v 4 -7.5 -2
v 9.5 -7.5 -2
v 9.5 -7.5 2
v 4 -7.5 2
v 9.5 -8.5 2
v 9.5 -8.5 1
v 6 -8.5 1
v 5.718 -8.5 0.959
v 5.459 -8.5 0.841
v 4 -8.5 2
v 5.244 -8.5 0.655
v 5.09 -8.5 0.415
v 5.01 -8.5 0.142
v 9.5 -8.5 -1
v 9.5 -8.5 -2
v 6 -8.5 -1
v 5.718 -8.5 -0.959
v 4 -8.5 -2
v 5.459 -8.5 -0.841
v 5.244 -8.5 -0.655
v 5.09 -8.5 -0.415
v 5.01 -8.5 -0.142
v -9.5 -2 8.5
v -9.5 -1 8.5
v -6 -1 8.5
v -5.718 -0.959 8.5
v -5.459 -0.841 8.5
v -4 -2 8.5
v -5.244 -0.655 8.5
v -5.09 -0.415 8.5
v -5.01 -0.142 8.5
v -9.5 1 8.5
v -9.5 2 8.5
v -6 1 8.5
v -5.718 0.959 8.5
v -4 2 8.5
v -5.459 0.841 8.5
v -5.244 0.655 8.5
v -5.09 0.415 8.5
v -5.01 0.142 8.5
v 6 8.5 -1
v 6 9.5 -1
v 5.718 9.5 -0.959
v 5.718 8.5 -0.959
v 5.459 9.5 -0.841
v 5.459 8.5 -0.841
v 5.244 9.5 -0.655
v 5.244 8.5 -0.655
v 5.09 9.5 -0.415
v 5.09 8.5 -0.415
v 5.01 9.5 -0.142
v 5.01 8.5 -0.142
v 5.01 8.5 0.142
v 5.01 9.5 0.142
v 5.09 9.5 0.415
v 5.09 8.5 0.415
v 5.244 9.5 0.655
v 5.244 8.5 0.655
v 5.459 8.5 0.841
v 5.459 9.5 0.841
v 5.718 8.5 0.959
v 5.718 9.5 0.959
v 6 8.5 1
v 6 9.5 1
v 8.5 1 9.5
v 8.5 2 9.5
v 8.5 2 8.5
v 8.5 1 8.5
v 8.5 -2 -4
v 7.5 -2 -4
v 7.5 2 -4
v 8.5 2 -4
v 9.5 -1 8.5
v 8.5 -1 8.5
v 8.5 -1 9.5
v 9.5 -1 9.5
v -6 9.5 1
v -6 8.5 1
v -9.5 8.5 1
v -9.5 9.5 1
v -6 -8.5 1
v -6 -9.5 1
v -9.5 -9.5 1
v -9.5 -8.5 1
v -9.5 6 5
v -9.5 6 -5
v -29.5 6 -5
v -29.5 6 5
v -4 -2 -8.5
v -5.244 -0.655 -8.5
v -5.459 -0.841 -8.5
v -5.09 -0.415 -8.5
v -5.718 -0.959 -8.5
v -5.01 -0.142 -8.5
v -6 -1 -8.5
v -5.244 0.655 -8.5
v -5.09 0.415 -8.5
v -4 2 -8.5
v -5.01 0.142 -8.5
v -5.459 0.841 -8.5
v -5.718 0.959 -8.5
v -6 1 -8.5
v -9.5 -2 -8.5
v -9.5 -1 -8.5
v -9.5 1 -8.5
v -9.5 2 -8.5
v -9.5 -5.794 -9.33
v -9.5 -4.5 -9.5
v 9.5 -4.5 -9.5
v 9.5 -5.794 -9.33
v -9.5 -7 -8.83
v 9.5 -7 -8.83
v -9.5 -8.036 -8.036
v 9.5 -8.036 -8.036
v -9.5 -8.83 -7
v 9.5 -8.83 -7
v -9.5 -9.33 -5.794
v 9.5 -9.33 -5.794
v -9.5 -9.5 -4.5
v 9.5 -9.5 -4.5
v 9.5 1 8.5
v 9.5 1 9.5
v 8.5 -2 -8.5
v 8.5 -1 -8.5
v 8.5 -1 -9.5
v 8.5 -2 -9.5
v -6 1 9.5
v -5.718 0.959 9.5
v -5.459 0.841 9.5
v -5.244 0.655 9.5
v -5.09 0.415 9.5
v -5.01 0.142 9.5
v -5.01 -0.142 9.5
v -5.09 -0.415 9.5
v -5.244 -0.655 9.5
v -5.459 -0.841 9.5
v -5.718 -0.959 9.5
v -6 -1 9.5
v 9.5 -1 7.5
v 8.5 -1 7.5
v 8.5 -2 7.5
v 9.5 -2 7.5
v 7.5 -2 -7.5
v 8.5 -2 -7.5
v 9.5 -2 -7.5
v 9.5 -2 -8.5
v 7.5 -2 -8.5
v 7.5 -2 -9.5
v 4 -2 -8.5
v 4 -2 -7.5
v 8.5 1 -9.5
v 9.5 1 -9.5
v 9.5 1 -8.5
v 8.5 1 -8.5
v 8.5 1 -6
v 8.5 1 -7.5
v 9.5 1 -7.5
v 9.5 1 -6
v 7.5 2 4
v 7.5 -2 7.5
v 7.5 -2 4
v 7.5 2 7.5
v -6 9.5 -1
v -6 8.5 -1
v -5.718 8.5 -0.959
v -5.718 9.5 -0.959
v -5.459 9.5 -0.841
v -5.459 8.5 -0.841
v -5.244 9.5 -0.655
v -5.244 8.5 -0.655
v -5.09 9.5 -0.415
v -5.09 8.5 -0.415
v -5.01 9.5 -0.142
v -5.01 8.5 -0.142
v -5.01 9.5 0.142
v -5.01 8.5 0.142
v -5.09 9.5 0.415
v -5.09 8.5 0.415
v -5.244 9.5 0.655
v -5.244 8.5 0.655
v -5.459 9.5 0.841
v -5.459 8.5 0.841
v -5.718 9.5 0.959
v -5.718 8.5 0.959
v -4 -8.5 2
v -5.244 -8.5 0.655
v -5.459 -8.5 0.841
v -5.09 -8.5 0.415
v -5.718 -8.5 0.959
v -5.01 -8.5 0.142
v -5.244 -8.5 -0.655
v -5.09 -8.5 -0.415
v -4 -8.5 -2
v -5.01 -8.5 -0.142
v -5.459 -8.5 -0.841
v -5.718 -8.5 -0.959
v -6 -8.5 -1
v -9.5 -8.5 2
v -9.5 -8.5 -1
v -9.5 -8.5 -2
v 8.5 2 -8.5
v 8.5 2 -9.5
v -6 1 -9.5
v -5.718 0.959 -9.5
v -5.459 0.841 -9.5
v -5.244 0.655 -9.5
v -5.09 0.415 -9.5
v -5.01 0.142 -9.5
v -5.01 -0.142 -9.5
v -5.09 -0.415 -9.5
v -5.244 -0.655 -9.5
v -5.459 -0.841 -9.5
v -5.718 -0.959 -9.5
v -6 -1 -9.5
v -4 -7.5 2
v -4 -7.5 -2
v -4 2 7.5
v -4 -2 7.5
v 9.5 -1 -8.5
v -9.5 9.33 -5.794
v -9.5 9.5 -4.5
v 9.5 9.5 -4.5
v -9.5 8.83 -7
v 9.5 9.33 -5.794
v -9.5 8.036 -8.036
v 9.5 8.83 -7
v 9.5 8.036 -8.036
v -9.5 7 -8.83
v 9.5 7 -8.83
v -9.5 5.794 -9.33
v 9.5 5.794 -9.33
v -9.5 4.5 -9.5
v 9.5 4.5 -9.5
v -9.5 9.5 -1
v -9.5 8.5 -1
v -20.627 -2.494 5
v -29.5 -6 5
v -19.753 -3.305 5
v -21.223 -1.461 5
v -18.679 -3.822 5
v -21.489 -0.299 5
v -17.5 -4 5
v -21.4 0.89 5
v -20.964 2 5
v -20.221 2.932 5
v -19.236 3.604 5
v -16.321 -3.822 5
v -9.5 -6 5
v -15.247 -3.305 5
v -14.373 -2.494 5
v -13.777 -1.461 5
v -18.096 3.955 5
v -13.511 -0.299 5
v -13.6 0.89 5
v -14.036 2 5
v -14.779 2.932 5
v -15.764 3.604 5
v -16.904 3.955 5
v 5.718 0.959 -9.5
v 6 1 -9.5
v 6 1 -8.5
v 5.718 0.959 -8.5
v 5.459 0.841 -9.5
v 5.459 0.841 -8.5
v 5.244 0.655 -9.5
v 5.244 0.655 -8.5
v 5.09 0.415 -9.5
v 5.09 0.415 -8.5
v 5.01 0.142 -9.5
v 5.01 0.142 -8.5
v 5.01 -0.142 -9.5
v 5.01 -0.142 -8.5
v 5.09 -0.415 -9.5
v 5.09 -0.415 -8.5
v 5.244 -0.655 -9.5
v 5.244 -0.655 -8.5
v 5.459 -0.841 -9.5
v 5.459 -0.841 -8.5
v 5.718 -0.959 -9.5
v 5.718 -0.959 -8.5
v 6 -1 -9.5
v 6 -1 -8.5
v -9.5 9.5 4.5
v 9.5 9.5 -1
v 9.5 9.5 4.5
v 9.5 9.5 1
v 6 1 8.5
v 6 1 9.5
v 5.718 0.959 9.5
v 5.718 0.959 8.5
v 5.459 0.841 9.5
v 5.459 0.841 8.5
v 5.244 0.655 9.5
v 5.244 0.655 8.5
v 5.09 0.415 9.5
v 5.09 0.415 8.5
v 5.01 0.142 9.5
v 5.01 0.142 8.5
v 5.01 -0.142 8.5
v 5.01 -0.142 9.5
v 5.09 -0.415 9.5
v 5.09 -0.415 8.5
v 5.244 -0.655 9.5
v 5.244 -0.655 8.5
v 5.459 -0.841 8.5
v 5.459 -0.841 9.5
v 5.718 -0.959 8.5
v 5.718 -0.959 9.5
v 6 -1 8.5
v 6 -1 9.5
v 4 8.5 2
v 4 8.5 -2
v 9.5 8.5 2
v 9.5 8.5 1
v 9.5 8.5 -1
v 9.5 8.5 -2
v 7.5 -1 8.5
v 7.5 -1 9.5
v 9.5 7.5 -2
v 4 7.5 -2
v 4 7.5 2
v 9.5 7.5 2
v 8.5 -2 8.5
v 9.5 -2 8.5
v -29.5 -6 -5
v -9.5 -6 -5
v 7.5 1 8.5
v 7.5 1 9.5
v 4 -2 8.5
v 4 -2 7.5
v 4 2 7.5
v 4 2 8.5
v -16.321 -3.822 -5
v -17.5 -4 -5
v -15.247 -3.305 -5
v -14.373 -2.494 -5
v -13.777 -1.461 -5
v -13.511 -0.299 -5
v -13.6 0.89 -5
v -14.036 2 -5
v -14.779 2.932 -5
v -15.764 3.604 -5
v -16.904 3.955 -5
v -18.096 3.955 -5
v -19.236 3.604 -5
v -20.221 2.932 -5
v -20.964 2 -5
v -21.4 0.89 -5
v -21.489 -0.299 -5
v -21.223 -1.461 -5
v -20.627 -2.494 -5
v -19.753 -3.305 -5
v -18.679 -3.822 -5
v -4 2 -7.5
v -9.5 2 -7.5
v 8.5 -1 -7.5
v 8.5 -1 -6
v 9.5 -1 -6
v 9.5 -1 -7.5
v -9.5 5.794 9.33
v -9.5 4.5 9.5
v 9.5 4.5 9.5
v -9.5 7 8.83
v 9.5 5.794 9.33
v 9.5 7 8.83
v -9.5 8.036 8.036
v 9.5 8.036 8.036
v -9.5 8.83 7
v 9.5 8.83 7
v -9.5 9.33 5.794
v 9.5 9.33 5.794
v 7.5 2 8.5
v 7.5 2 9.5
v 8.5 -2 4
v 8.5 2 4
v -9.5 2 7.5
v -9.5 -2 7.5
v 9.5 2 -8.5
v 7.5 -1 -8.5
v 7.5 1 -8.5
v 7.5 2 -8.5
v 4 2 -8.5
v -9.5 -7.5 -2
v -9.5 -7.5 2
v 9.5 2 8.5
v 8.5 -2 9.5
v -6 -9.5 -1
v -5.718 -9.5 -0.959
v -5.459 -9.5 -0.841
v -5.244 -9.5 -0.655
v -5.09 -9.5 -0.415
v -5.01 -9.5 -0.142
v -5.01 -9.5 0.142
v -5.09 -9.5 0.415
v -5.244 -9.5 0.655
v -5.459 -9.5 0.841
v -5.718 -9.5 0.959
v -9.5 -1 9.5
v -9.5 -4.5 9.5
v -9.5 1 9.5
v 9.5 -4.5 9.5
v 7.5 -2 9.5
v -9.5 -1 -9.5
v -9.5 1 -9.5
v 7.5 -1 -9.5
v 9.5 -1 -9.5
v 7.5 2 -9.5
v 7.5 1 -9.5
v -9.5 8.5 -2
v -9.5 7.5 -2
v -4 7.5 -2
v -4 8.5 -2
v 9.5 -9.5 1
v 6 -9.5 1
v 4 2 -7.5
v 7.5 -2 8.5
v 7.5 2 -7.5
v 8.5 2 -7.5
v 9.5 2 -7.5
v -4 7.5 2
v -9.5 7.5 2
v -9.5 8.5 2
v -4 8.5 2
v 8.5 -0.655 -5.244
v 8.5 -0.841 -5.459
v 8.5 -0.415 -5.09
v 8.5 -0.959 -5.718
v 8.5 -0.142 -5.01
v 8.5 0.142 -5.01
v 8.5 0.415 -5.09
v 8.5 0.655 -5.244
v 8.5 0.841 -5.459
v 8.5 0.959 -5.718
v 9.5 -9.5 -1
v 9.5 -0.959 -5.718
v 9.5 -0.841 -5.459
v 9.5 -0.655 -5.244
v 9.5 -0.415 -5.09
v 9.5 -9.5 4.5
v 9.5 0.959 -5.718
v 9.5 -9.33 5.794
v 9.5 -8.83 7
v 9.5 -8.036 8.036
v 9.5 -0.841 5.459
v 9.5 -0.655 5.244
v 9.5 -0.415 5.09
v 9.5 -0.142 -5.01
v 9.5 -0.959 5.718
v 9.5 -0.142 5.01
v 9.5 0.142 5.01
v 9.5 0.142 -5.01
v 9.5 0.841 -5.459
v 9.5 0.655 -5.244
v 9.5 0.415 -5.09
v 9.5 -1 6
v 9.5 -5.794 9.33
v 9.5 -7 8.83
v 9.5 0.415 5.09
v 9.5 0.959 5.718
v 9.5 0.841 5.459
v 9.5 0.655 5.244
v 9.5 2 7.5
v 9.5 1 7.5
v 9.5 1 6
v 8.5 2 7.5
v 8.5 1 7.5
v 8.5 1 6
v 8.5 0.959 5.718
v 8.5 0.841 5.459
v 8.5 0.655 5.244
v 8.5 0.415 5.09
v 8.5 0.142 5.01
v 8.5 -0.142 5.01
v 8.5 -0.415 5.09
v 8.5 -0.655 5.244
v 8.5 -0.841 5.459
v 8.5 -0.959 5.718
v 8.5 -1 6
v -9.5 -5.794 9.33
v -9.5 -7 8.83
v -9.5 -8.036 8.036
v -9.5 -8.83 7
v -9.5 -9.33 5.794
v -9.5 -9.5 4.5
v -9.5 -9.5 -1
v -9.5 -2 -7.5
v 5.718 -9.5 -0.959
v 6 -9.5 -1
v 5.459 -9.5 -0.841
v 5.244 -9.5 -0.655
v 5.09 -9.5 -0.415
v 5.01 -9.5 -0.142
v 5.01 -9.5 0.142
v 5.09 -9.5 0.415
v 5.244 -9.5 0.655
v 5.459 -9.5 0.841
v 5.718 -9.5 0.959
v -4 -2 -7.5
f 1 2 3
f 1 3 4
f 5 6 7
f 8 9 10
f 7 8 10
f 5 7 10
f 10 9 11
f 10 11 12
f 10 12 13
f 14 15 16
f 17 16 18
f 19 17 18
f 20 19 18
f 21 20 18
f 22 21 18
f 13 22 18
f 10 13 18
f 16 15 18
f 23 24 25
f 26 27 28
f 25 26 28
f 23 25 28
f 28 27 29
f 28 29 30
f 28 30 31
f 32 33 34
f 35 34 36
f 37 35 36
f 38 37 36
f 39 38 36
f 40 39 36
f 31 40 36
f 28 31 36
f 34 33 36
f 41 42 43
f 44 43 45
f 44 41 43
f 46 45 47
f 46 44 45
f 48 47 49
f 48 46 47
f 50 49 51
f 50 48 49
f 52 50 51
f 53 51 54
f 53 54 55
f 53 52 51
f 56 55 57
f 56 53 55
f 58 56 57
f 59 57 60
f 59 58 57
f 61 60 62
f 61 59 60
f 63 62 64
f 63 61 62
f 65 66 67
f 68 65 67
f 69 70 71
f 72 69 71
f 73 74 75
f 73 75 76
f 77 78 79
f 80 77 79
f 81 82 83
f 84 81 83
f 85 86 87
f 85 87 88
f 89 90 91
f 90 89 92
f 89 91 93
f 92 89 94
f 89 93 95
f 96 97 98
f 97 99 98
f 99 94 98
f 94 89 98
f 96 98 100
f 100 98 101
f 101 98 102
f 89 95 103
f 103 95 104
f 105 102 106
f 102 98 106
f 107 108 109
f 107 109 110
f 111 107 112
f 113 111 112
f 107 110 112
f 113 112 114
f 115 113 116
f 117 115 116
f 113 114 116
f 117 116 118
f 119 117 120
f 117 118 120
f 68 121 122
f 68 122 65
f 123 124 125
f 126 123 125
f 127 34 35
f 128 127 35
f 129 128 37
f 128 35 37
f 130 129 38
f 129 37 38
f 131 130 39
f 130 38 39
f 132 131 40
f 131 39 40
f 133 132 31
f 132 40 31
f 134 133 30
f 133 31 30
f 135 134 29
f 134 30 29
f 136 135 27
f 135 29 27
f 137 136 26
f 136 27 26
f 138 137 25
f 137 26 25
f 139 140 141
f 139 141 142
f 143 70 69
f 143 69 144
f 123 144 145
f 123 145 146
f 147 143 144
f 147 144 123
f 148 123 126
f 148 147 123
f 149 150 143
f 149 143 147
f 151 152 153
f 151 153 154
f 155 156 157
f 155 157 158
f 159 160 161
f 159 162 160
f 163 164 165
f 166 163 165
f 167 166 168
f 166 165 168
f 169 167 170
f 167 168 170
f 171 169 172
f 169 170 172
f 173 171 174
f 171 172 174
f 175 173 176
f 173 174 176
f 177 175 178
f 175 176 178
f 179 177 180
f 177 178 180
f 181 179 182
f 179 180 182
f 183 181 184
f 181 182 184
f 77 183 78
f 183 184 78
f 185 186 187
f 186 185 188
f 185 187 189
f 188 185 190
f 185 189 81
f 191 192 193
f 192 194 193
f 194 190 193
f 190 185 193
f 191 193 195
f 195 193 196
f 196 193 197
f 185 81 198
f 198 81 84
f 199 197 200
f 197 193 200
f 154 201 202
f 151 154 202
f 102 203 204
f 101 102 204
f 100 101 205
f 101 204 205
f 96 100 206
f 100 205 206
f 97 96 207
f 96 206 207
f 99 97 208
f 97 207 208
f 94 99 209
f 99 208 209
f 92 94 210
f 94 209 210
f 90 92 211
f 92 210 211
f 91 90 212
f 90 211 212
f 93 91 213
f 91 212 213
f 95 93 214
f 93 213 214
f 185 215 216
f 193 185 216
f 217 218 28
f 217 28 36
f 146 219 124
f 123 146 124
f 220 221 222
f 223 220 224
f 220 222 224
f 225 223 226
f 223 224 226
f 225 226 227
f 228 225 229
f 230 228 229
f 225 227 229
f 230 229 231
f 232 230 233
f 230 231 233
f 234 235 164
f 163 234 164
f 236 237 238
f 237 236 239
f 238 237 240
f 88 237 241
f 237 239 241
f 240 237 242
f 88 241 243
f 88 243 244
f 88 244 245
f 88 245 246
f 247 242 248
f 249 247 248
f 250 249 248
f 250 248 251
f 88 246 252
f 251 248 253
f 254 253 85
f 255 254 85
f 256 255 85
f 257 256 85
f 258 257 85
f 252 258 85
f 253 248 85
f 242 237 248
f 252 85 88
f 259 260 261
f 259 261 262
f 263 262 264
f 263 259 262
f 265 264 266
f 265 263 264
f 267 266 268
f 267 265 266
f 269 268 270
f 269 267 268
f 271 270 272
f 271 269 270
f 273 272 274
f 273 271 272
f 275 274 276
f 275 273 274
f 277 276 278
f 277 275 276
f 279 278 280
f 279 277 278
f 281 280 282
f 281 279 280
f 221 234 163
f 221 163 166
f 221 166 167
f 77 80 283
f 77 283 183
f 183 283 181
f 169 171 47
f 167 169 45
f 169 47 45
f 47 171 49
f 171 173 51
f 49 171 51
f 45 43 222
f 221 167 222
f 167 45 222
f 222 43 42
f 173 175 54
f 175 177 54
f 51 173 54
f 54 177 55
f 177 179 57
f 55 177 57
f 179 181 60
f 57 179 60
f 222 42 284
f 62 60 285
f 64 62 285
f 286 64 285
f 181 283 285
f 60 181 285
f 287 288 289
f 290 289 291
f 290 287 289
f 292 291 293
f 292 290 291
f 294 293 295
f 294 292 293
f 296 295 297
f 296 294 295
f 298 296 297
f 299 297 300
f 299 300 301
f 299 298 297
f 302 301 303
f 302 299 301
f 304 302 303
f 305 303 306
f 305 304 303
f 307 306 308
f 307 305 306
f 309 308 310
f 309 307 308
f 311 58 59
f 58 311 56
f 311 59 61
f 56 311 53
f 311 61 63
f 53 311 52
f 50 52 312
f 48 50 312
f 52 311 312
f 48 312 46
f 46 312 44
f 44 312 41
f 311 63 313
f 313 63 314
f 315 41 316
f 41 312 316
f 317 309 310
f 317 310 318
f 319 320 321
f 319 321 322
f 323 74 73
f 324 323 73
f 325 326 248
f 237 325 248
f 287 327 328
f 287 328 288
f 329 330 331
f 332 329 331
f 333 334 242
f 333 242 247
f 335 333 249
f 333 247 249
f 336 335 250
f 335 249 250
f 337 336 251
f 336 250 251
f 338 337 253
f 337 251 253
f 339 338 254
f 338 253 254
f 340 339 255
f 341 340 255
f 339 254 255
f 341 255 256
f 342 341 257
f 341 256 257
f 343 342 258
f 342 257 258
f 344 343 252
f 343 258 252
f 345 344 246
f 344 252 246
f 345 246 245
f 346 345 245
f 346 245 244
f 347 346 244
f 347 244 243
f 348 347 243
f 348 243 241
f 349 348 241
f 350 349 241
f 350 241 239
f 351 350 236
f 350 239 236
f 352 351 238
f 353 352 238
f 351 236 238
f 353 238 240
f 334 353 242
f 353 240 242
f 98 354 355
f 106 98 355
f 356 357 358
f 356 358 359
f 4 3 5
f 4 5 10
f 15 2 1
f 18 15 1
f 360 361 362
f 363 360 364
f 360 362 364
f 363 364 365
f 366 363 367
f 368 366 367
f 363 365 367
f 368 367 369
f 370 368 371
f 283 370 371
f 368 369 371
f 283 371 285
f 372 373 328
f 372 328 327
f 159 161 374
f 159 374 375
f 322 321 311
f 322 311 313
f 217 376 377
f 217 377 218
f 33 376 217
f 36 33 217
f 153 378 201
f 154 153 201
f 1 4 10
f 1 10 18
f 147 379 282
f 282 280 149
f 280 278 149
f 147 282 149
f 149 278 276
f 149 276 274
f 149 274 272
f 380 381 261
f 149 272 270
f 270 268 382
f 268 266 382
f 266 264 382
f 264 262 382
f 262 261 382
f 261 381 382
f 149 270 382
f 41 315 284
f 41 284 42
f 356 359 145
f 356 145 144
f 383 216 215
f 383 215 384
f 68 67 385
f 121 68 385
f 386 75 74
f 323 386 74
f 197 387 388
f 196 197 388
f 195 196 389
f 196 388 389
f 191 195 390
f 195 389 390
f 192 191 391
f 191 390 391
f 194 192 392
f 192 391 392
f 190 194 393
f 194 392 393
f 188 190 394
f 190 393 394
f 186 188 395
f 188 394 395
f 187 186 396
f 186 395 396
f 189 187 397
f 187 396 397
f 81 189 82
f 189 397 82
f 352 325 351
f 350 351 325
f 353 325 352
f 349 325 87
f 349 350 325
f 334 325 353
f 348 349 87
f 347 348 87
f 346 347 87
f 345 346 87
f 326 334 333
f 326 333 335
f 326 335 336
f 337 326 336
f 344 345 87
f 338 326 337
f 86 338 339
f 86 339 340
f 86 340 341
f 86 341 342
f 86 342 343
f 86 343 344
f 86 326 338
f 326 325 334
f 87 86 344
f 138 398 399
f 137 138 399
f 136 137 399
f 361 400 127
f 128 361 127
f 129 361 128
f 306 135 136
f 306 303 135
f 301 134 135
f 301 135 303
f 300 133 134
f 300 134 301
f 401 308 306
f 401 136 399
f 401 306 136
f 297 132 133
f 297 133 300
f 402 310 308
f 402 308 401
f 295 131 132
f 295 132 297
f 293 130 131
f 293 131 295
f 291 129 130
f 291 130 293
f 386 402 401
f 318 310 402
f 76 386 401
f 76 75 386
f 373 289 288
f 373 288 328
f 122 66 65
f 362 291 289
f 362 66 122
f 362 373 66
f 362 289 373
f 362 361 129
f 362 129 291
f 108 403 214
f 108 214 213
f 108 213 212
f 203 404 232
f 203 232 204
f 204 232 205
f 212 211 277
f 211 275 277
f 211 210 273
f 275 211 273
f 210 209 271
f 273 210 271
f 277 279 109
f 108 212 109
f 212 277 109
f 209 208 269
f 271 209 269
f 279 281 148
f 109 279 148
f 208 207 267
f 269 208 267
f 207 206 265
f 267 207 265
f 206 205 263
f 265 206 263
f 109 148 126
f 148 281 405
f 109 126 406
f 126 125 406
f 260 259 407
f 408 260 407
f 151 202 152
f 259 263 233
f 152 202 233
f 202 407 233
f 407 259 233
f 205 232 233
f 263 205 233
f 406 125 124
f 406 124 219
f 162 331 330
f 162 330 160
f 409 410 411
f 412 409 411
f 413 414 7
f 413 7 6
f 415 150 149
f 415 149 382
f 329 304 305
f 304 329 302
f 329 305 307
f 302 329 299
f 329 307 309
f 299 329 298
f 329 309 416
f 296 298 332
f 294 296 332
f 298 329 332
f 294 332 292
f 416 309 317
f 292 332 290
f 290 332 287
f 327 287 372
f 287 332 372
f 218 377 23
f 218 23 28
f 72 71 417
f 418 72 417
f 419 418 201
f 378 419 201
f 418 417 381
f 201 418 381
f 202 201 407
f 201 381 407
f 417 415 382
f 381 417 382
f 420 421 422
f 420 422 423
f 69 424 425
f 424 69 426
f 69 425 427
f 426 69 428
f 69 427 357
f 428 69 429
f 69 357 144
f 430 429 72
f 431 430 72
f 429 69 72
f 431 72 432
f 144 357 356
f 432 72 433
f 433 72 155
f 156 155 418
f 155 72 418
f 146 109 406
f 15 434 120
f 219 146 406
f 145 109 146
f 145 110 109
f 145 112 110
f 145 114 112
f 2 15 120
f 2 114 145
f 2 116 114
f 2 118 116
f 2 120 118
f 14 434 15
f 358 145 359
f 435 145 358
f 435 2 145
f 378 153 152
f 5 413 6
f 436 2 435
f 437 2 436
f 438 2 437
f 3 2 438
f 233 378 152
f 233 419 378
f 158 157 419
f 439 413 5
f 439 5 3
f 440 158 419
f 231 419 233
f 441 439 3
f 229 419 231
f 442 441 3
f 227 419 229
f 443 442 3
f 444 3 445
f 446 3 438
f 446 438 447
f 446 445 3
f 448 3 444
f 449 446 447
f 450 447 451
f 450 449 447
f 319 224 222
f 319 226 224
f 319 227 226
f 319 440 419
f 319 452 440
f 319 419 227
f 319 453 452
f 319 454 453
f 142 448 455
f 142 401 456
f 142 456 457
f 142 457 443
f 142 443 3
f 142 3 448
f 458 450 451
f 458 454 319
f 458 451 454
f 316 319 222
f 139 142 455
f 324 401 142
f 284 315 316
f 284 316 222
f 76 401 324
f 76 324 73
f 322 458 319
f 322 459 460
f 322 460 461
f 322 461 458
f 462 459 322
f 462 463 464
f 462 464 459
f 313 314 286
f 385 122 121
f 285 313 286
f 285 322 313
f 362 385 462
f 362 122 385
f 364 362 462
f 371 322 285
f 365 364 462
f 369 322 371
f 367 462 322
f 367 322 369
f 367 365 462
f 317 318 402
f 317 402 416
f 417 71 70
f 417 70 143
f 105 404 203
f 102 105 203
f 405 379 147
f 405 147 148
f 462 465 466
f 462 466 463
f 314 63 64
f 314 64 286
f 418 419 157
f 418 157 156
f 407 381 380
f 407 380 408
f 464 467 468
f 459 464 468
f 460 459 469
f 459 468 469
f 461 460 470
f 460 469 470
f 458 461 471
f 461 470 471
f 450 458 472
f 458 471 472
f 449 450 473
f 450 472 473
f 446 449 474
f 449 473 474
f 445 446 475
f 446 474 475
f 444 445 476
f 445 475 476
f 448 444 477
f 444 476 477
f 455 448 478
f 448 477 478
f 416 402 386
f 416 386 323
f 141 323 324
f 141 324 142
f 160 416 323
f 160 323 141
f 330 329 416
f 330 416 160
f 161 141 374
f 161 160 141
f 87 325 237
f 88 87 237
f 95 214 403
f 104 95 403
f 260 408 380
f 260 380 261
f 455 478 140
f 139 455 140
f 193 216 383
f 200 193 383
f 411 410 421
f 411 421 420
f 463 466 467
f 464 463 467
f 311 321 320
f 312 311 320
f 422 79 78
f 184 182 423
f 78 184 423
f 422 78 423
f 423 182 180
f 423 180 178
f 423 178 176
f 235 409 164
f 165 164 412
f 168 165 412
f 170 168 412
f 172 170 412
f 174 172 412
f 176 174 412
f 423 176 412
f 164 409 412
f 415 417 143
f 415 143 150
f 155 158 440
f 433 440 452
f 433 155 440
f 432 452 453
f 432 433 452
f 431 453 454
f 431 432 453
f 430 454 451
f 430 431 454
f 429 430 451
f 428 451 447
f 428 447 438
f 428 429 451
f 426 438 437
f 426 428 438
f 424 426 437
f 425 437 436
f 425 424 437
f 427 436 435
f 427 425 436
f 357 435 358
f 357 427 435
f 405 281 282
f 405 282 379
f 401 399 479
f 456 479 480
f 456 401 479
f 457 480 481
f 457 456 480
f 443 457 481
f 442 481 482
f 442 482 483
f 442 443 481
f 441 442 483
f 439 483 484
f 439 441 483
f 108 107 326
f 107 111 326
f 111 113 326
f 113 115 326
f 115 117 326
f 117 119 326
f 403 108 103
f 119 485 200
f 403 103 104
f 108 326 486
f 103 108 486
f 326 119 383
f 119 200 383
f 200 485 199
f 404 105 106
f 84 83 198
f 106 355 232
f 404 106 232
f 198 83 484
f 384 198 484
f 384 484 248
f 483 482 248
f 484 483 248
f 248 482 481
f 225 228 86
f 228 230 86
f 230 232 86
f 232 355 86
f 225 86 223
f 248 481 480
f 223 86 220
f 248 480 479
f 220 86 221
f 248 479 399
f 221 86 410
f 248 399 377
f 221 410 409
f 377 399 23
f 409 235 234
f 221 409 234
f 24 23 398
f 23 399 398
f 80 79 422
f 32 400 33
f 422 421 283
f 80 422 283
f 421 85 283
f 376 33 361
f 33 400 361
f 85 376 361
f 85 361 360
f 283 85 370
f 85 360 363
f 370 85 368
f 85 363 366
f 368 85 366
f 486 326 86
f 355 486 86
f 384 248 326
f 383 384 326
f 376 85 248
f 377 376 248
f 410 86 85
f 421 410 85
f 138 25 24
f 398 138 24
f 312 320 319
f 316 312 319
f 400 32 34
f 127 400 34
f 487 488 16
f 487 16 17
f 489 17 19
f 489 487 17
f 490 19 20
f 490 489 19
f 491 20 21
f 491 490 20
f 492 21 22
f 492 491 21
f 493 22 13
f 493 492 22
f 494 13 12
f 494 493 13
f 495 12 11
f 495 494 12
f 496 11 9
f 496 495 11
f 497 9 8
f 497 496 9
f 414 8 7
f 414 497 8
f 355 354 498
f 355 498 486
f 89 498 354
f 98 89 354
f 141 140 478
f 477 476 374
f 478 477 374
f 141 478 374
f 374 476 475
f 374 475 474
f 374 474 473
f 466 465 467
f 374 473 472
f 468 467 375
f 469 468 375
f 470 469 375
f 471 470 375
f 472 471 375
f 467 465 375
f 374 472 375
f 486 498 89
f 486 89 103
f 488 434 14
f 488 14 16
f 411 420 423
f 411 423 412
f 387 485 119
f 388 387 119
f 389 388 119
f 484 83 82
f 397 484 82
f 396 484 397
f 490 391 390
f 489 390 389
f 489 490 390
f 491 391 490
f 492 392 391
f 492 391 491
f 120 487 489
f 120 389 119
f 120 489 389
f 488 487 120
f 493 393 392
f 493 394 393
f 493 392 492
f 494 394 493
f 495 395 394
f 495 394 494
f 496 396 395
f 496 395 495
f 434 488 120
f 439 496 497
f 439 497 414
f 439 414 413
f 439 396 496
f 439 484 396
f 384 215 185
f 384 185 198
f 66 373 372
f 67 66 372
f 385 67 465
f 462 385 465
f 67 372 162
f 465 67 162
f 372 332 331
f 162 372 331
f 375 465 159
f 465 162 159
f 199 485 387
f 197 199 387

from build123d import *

# Parameters (mm, degrees)
SKETCH_2_W           = 19
SKETCH_2_H           = 19
EXTRUDE_1_DEPTH      = 9.5
FILLET_1_R           = 5
FILLET_2_R           = 5
SKETCH_7_W           = 5.5
SKETCH_7_H           = 4
CUT_EXTRUDE_5_DEPTH  = 1
CUT_EXTRUDE_6_DEPTH  = 1
SKETCH_13_W          = 5.5
SKETCH_13_H          = 4
CUT_EXTRUDE_10_DEPTH = 1
SKETCH_14_W          = 5.5
SKETCH_14_H          = 4
CUT_EXTRUDE_11_DEPTH = 1
SKETCH_15_W          = 5.5
SKETCH_15_H          = 4
CUT_EXTRUDE_12_DEPTH = 1
CUT_EXTRUDE_13_DEPTH = 2
CUT_EXTRUDE_14_DEPTH = 2
CUT_EXTRUDE_START    = 2
CUT_EXTRUDE_15_DEPTH = 2
SKETCH_23_W          = 5.5
SKETCH_23_H          = 4
CUT_EXTRUDE_16_DEPTH = 1
CUT_EXTRUDE_17_DEPTH = 2
SKETCH_27_W          = 10
SKETCH_27_H          = 12
EXTRUDE_2_DEPTH      = 20
SKETCH_28_R          = 4
CUT_EXTRUDE_20_DEPTH = 10


with BuildPart() as part:
    # 草图2 → 凸台-拉伸1 (new, symmetric)
    with BuildSketch(Plane.XY):
        Rectangle(SKETCH_2_W, SKETCH_2_H)
    extrude(amount=EXTRUDE_1_DEPTH, both=True)

    # 圆角1
    fillet_1_edges = [part.edges().sort_by_distance(p)[0] for p in [
        (0, 9.5, 9.5),
    ]]
    fillet(fillet_1_edges, radius=FILLET_1_R)

    # 圆角2
    fillet_2_edges = [part.edges().sort_by_distance(p)[0] for p in [
        (0, -9.5, 9.5),
        (0, -9.5, -9.5),
        (0, 9.5, -9.5),
    ]]
    fillet(fillet_2_edges, radius=FILLET_2_R)

    # 草图7 → 切除-拉伸5 (cut)
    with BuildSketch(Plane(origin=(0, -7.5, 0), x_dir=(-1, 0, 0), z_dir=(0, -1, 0))):
        with Locations((-6.75, 0)):
            Rectangle(SKETCH_7_W, SKETCH_7_H)
        with Locations((6.75, 0)):
            Rectangle(SKETCH_7_W, SKETCH_7_H)
    extrude(amount=CUT_EXTRUDE_5_DEPTH, mode=Mode.SUBTRACT)

    # 草图9 → 切除-拉伸6 (cut)
    with BuildSketch(Plane.XZ.offset(9.5)):
        with BuildLine():
            Line((6, 1), (9.5, 1))
            Line((9.5, 1), (9.5, -1))
            Line((9.5, -1), (6, -1))
            ThreePointArc((6, -1), (5, 0), (6, 1))
        make_face()
        with BuildLine():
            Line((-9.5, 1), (-9.5, -1))
            Line((-9.5, -1), (-6, -1))
            ThreePointArc((-6, -1), (-5, 0), (-6, 1))
            Line((-6, 1), (-9.5, 1))
        make_face()
    extrude(amount=-CUT_EXTRUDE_6_DEPTH, mode=Mode.SUBTRACT)

    # 草图13 → 切除-拉伸10 (cut)
    with BuildSketch(Plane.XY.offset(7.5)):
        with Locations((-6.75, 0)):
            Rectangle(SKETCH_13_W, SKETCH_13_H)
        with Locations((6.75, 0)):
            Rectangle(SKETCH_13_W, SKETCH_13_H)
    extrude(amount=CUT_EXTRUDE_10_DEPTH, mode=Mode.SUBTRACT)

    # 草图14 → 切除-拉伸11 (cut)
    with BuildSketch(Plane(origin=(0, 7.5, 0), x_dir=(1, 0, 0), z_dir=(0, 1, 0))):
        with Locations((-6.75, 0)):
            Rectangle(SKETCH_14_W, SKETCH_14_H)
        with Locations((6.75, 0)):
            Rectangle(SKETCH_14_W, SKETCH_14_H)
    extrude(amount=CUT_EXTRUDE_11_DEPTH, mode=Mode.SUBTRACT)

    # 草图15 → 切除-拉伸12 (cut)
    with BuildSketch(Plane(origin=(0, 0, -7.5), x_dir=(-1, 0, 0), z_dir=(0, 0, -1))):
        with Locations((-6.75, 0)):
            Rectangle(SKETCH_15_W, SKETCH_15_H)
        with Locations((6.75, 0)):
            Rectangle(SKETCH_15_W, SKETCH_15_H)
    extrude(amount=CUT_EXTRUDE_12_DEPTH, mode=Mode.SUBTRACT)

    # 草图20 → 切除-拉伸13 (cut)
    with BuildSketch(Plane(origin=(0, 0, 7.5), x_dir=(-1, 0, 0), z_dir=(0, 0, 1))):
        with BuildLine():
            Line((6, 1), (9.5, 1))
            Line((9.5, 1), (9.5, -1))
            Line((9.5, -1), (6, -1))
            ThreePointArc((6, -1), (5, 0), (6, 1))
        make_face()
        with BuildLine():
            Line((-9.5, 1), (-9.5, -1))
            Line((-9.5, -1), (-6, -1))
            ThreePointArc((-6, -1), (-5, 0), (-6, 1))
            Line((-6, 1), (-9.5, 1))
        make_face()
    extrude(amount=CUT_EXTRUDE_13_DEPTH, mode=Mode.SUBTRACT)

    # 草图21 → 切除-拉伸14 (cut)
    with BuildSketch(Plane(origin=(0, 7.5, 0), x_dir=(-1, 0, 0), z_dir=(0, 1, 0))):
        with BuildLine():
            Line((6, 1), (9.5, 1))
            Line((9.5, 1), (9.5, -1))
            Line((9.5, -1), (6, -1))
            ThreePointArc((6, -1), (5, 0), (6, 1))
        make_face()
        with BuildLine():
            Line((-9.5, 1), (-9.5, -1))
            Line((-9.5, -1), (-6, -1))
            ThreePointArc((-6, -1), (-5, 0), (-6, 1))
            Line((-6, 1), (-9.5, 1))
        make_face()
    extrude(amount=CUT_EXTRUDE_14_DEPTH, mode=Mode.SUBTRACT)

    # 草图22 → 切除-拉伸15 (cut)
    with BuildSketch(Plane(origin=(0, 0, -7.5), x_dir=(1, 0, 0), z_dir=(0, 0, -1)).offset(CUT_EXTRUDE_START)):
        with BuildLine():
            Line((6, 1), (9.5, 1))
            Line((9.5, 1), (9.5, -1))
            Line((9.5, -1), (6, -1))
            ThreePointArc((6, -1), (5, 0), (6, 1))
        make_face()
        with BuildLine():
            Line((-9.5, 1), (-9.5, -1))
            Line((-9.5, -1), (-6, -1))
            ThreePointArc((-6, -1), (-5, 0), (-6, 1))
            Line((-6, 1), (-9.5, 1))
        make_face()
    extrude(amount=-CUT_EXTRUDE_15_DEPTH, mode=Mode.SUBTRACT)

    # 草图23 → 切除-拉伸16 (cut)
    with BuildSketch(Plane(origin=(7.5, 0, 0), x_dir=(0, 0, -1), z_dir=(1, 0, 0))):
        with Locations((-6.75, 0)):
            Rectangle(SKETCH_23_W, SKETCH_23_H)
        with Locations((6.75, 0)):
            Rectangle(SKETCH_23_W, SKETCH_23_H)
    extrude(amount=CUT_EXTRUDE_16_DEPTH, mode=Mode.SUBTRACT)

    # 草图24 → 切除-拉伸17 (cut)
    with BuildSketch(Plane(origin=(7.5, 0, 0), x_dir=(0, 0, 1), z_dir=(1, 0, 0))):
        with BuildLine():
            Line((6, 1), (9.5, 1))
            Line((9.5, 1), (9.5, -1))
            Line((9.5, -1), (6, -1))
            ThreePointArc((6, -1), (5, 0), (6, 1))
        make_face()
        with BuildLine():
            Line((-9.5, 1), (-9.5, -1))
            Line((-9.5, -1), (-6, -1))
            ThreePointArc((-6, -1), (-5, 0), (-6, 1))
            Line((-6, 1), (-9.5, 1))
        make_face()
    extrude(amount=CUT_EXTRUDE_17_DEPTH, mode=Mode.SUBTRACT)

    # 草图27 → 凸台-拉伸2 (add)
    with BuildSketch(Plane.ZY.offset(9.5)):
        Rectangle(SKETCH_27_W, SKETCH_27_H)
    extrude(amount=EXTRUDE_2_DEPTH)

    # 草图28 → 切除-拉伸20 (cut, symmetric)
    with BuildSketch(Plane.XY):
        with Locations(Location((-17.5, 0, 0), (0, 0, 270))):
            Circle(SKETCH_28_R)
    extrude(amount=CUT_EXTRUDE_20_DEPTH, both=True, mode=Mode.SUBTRACT)


solid = part.part
